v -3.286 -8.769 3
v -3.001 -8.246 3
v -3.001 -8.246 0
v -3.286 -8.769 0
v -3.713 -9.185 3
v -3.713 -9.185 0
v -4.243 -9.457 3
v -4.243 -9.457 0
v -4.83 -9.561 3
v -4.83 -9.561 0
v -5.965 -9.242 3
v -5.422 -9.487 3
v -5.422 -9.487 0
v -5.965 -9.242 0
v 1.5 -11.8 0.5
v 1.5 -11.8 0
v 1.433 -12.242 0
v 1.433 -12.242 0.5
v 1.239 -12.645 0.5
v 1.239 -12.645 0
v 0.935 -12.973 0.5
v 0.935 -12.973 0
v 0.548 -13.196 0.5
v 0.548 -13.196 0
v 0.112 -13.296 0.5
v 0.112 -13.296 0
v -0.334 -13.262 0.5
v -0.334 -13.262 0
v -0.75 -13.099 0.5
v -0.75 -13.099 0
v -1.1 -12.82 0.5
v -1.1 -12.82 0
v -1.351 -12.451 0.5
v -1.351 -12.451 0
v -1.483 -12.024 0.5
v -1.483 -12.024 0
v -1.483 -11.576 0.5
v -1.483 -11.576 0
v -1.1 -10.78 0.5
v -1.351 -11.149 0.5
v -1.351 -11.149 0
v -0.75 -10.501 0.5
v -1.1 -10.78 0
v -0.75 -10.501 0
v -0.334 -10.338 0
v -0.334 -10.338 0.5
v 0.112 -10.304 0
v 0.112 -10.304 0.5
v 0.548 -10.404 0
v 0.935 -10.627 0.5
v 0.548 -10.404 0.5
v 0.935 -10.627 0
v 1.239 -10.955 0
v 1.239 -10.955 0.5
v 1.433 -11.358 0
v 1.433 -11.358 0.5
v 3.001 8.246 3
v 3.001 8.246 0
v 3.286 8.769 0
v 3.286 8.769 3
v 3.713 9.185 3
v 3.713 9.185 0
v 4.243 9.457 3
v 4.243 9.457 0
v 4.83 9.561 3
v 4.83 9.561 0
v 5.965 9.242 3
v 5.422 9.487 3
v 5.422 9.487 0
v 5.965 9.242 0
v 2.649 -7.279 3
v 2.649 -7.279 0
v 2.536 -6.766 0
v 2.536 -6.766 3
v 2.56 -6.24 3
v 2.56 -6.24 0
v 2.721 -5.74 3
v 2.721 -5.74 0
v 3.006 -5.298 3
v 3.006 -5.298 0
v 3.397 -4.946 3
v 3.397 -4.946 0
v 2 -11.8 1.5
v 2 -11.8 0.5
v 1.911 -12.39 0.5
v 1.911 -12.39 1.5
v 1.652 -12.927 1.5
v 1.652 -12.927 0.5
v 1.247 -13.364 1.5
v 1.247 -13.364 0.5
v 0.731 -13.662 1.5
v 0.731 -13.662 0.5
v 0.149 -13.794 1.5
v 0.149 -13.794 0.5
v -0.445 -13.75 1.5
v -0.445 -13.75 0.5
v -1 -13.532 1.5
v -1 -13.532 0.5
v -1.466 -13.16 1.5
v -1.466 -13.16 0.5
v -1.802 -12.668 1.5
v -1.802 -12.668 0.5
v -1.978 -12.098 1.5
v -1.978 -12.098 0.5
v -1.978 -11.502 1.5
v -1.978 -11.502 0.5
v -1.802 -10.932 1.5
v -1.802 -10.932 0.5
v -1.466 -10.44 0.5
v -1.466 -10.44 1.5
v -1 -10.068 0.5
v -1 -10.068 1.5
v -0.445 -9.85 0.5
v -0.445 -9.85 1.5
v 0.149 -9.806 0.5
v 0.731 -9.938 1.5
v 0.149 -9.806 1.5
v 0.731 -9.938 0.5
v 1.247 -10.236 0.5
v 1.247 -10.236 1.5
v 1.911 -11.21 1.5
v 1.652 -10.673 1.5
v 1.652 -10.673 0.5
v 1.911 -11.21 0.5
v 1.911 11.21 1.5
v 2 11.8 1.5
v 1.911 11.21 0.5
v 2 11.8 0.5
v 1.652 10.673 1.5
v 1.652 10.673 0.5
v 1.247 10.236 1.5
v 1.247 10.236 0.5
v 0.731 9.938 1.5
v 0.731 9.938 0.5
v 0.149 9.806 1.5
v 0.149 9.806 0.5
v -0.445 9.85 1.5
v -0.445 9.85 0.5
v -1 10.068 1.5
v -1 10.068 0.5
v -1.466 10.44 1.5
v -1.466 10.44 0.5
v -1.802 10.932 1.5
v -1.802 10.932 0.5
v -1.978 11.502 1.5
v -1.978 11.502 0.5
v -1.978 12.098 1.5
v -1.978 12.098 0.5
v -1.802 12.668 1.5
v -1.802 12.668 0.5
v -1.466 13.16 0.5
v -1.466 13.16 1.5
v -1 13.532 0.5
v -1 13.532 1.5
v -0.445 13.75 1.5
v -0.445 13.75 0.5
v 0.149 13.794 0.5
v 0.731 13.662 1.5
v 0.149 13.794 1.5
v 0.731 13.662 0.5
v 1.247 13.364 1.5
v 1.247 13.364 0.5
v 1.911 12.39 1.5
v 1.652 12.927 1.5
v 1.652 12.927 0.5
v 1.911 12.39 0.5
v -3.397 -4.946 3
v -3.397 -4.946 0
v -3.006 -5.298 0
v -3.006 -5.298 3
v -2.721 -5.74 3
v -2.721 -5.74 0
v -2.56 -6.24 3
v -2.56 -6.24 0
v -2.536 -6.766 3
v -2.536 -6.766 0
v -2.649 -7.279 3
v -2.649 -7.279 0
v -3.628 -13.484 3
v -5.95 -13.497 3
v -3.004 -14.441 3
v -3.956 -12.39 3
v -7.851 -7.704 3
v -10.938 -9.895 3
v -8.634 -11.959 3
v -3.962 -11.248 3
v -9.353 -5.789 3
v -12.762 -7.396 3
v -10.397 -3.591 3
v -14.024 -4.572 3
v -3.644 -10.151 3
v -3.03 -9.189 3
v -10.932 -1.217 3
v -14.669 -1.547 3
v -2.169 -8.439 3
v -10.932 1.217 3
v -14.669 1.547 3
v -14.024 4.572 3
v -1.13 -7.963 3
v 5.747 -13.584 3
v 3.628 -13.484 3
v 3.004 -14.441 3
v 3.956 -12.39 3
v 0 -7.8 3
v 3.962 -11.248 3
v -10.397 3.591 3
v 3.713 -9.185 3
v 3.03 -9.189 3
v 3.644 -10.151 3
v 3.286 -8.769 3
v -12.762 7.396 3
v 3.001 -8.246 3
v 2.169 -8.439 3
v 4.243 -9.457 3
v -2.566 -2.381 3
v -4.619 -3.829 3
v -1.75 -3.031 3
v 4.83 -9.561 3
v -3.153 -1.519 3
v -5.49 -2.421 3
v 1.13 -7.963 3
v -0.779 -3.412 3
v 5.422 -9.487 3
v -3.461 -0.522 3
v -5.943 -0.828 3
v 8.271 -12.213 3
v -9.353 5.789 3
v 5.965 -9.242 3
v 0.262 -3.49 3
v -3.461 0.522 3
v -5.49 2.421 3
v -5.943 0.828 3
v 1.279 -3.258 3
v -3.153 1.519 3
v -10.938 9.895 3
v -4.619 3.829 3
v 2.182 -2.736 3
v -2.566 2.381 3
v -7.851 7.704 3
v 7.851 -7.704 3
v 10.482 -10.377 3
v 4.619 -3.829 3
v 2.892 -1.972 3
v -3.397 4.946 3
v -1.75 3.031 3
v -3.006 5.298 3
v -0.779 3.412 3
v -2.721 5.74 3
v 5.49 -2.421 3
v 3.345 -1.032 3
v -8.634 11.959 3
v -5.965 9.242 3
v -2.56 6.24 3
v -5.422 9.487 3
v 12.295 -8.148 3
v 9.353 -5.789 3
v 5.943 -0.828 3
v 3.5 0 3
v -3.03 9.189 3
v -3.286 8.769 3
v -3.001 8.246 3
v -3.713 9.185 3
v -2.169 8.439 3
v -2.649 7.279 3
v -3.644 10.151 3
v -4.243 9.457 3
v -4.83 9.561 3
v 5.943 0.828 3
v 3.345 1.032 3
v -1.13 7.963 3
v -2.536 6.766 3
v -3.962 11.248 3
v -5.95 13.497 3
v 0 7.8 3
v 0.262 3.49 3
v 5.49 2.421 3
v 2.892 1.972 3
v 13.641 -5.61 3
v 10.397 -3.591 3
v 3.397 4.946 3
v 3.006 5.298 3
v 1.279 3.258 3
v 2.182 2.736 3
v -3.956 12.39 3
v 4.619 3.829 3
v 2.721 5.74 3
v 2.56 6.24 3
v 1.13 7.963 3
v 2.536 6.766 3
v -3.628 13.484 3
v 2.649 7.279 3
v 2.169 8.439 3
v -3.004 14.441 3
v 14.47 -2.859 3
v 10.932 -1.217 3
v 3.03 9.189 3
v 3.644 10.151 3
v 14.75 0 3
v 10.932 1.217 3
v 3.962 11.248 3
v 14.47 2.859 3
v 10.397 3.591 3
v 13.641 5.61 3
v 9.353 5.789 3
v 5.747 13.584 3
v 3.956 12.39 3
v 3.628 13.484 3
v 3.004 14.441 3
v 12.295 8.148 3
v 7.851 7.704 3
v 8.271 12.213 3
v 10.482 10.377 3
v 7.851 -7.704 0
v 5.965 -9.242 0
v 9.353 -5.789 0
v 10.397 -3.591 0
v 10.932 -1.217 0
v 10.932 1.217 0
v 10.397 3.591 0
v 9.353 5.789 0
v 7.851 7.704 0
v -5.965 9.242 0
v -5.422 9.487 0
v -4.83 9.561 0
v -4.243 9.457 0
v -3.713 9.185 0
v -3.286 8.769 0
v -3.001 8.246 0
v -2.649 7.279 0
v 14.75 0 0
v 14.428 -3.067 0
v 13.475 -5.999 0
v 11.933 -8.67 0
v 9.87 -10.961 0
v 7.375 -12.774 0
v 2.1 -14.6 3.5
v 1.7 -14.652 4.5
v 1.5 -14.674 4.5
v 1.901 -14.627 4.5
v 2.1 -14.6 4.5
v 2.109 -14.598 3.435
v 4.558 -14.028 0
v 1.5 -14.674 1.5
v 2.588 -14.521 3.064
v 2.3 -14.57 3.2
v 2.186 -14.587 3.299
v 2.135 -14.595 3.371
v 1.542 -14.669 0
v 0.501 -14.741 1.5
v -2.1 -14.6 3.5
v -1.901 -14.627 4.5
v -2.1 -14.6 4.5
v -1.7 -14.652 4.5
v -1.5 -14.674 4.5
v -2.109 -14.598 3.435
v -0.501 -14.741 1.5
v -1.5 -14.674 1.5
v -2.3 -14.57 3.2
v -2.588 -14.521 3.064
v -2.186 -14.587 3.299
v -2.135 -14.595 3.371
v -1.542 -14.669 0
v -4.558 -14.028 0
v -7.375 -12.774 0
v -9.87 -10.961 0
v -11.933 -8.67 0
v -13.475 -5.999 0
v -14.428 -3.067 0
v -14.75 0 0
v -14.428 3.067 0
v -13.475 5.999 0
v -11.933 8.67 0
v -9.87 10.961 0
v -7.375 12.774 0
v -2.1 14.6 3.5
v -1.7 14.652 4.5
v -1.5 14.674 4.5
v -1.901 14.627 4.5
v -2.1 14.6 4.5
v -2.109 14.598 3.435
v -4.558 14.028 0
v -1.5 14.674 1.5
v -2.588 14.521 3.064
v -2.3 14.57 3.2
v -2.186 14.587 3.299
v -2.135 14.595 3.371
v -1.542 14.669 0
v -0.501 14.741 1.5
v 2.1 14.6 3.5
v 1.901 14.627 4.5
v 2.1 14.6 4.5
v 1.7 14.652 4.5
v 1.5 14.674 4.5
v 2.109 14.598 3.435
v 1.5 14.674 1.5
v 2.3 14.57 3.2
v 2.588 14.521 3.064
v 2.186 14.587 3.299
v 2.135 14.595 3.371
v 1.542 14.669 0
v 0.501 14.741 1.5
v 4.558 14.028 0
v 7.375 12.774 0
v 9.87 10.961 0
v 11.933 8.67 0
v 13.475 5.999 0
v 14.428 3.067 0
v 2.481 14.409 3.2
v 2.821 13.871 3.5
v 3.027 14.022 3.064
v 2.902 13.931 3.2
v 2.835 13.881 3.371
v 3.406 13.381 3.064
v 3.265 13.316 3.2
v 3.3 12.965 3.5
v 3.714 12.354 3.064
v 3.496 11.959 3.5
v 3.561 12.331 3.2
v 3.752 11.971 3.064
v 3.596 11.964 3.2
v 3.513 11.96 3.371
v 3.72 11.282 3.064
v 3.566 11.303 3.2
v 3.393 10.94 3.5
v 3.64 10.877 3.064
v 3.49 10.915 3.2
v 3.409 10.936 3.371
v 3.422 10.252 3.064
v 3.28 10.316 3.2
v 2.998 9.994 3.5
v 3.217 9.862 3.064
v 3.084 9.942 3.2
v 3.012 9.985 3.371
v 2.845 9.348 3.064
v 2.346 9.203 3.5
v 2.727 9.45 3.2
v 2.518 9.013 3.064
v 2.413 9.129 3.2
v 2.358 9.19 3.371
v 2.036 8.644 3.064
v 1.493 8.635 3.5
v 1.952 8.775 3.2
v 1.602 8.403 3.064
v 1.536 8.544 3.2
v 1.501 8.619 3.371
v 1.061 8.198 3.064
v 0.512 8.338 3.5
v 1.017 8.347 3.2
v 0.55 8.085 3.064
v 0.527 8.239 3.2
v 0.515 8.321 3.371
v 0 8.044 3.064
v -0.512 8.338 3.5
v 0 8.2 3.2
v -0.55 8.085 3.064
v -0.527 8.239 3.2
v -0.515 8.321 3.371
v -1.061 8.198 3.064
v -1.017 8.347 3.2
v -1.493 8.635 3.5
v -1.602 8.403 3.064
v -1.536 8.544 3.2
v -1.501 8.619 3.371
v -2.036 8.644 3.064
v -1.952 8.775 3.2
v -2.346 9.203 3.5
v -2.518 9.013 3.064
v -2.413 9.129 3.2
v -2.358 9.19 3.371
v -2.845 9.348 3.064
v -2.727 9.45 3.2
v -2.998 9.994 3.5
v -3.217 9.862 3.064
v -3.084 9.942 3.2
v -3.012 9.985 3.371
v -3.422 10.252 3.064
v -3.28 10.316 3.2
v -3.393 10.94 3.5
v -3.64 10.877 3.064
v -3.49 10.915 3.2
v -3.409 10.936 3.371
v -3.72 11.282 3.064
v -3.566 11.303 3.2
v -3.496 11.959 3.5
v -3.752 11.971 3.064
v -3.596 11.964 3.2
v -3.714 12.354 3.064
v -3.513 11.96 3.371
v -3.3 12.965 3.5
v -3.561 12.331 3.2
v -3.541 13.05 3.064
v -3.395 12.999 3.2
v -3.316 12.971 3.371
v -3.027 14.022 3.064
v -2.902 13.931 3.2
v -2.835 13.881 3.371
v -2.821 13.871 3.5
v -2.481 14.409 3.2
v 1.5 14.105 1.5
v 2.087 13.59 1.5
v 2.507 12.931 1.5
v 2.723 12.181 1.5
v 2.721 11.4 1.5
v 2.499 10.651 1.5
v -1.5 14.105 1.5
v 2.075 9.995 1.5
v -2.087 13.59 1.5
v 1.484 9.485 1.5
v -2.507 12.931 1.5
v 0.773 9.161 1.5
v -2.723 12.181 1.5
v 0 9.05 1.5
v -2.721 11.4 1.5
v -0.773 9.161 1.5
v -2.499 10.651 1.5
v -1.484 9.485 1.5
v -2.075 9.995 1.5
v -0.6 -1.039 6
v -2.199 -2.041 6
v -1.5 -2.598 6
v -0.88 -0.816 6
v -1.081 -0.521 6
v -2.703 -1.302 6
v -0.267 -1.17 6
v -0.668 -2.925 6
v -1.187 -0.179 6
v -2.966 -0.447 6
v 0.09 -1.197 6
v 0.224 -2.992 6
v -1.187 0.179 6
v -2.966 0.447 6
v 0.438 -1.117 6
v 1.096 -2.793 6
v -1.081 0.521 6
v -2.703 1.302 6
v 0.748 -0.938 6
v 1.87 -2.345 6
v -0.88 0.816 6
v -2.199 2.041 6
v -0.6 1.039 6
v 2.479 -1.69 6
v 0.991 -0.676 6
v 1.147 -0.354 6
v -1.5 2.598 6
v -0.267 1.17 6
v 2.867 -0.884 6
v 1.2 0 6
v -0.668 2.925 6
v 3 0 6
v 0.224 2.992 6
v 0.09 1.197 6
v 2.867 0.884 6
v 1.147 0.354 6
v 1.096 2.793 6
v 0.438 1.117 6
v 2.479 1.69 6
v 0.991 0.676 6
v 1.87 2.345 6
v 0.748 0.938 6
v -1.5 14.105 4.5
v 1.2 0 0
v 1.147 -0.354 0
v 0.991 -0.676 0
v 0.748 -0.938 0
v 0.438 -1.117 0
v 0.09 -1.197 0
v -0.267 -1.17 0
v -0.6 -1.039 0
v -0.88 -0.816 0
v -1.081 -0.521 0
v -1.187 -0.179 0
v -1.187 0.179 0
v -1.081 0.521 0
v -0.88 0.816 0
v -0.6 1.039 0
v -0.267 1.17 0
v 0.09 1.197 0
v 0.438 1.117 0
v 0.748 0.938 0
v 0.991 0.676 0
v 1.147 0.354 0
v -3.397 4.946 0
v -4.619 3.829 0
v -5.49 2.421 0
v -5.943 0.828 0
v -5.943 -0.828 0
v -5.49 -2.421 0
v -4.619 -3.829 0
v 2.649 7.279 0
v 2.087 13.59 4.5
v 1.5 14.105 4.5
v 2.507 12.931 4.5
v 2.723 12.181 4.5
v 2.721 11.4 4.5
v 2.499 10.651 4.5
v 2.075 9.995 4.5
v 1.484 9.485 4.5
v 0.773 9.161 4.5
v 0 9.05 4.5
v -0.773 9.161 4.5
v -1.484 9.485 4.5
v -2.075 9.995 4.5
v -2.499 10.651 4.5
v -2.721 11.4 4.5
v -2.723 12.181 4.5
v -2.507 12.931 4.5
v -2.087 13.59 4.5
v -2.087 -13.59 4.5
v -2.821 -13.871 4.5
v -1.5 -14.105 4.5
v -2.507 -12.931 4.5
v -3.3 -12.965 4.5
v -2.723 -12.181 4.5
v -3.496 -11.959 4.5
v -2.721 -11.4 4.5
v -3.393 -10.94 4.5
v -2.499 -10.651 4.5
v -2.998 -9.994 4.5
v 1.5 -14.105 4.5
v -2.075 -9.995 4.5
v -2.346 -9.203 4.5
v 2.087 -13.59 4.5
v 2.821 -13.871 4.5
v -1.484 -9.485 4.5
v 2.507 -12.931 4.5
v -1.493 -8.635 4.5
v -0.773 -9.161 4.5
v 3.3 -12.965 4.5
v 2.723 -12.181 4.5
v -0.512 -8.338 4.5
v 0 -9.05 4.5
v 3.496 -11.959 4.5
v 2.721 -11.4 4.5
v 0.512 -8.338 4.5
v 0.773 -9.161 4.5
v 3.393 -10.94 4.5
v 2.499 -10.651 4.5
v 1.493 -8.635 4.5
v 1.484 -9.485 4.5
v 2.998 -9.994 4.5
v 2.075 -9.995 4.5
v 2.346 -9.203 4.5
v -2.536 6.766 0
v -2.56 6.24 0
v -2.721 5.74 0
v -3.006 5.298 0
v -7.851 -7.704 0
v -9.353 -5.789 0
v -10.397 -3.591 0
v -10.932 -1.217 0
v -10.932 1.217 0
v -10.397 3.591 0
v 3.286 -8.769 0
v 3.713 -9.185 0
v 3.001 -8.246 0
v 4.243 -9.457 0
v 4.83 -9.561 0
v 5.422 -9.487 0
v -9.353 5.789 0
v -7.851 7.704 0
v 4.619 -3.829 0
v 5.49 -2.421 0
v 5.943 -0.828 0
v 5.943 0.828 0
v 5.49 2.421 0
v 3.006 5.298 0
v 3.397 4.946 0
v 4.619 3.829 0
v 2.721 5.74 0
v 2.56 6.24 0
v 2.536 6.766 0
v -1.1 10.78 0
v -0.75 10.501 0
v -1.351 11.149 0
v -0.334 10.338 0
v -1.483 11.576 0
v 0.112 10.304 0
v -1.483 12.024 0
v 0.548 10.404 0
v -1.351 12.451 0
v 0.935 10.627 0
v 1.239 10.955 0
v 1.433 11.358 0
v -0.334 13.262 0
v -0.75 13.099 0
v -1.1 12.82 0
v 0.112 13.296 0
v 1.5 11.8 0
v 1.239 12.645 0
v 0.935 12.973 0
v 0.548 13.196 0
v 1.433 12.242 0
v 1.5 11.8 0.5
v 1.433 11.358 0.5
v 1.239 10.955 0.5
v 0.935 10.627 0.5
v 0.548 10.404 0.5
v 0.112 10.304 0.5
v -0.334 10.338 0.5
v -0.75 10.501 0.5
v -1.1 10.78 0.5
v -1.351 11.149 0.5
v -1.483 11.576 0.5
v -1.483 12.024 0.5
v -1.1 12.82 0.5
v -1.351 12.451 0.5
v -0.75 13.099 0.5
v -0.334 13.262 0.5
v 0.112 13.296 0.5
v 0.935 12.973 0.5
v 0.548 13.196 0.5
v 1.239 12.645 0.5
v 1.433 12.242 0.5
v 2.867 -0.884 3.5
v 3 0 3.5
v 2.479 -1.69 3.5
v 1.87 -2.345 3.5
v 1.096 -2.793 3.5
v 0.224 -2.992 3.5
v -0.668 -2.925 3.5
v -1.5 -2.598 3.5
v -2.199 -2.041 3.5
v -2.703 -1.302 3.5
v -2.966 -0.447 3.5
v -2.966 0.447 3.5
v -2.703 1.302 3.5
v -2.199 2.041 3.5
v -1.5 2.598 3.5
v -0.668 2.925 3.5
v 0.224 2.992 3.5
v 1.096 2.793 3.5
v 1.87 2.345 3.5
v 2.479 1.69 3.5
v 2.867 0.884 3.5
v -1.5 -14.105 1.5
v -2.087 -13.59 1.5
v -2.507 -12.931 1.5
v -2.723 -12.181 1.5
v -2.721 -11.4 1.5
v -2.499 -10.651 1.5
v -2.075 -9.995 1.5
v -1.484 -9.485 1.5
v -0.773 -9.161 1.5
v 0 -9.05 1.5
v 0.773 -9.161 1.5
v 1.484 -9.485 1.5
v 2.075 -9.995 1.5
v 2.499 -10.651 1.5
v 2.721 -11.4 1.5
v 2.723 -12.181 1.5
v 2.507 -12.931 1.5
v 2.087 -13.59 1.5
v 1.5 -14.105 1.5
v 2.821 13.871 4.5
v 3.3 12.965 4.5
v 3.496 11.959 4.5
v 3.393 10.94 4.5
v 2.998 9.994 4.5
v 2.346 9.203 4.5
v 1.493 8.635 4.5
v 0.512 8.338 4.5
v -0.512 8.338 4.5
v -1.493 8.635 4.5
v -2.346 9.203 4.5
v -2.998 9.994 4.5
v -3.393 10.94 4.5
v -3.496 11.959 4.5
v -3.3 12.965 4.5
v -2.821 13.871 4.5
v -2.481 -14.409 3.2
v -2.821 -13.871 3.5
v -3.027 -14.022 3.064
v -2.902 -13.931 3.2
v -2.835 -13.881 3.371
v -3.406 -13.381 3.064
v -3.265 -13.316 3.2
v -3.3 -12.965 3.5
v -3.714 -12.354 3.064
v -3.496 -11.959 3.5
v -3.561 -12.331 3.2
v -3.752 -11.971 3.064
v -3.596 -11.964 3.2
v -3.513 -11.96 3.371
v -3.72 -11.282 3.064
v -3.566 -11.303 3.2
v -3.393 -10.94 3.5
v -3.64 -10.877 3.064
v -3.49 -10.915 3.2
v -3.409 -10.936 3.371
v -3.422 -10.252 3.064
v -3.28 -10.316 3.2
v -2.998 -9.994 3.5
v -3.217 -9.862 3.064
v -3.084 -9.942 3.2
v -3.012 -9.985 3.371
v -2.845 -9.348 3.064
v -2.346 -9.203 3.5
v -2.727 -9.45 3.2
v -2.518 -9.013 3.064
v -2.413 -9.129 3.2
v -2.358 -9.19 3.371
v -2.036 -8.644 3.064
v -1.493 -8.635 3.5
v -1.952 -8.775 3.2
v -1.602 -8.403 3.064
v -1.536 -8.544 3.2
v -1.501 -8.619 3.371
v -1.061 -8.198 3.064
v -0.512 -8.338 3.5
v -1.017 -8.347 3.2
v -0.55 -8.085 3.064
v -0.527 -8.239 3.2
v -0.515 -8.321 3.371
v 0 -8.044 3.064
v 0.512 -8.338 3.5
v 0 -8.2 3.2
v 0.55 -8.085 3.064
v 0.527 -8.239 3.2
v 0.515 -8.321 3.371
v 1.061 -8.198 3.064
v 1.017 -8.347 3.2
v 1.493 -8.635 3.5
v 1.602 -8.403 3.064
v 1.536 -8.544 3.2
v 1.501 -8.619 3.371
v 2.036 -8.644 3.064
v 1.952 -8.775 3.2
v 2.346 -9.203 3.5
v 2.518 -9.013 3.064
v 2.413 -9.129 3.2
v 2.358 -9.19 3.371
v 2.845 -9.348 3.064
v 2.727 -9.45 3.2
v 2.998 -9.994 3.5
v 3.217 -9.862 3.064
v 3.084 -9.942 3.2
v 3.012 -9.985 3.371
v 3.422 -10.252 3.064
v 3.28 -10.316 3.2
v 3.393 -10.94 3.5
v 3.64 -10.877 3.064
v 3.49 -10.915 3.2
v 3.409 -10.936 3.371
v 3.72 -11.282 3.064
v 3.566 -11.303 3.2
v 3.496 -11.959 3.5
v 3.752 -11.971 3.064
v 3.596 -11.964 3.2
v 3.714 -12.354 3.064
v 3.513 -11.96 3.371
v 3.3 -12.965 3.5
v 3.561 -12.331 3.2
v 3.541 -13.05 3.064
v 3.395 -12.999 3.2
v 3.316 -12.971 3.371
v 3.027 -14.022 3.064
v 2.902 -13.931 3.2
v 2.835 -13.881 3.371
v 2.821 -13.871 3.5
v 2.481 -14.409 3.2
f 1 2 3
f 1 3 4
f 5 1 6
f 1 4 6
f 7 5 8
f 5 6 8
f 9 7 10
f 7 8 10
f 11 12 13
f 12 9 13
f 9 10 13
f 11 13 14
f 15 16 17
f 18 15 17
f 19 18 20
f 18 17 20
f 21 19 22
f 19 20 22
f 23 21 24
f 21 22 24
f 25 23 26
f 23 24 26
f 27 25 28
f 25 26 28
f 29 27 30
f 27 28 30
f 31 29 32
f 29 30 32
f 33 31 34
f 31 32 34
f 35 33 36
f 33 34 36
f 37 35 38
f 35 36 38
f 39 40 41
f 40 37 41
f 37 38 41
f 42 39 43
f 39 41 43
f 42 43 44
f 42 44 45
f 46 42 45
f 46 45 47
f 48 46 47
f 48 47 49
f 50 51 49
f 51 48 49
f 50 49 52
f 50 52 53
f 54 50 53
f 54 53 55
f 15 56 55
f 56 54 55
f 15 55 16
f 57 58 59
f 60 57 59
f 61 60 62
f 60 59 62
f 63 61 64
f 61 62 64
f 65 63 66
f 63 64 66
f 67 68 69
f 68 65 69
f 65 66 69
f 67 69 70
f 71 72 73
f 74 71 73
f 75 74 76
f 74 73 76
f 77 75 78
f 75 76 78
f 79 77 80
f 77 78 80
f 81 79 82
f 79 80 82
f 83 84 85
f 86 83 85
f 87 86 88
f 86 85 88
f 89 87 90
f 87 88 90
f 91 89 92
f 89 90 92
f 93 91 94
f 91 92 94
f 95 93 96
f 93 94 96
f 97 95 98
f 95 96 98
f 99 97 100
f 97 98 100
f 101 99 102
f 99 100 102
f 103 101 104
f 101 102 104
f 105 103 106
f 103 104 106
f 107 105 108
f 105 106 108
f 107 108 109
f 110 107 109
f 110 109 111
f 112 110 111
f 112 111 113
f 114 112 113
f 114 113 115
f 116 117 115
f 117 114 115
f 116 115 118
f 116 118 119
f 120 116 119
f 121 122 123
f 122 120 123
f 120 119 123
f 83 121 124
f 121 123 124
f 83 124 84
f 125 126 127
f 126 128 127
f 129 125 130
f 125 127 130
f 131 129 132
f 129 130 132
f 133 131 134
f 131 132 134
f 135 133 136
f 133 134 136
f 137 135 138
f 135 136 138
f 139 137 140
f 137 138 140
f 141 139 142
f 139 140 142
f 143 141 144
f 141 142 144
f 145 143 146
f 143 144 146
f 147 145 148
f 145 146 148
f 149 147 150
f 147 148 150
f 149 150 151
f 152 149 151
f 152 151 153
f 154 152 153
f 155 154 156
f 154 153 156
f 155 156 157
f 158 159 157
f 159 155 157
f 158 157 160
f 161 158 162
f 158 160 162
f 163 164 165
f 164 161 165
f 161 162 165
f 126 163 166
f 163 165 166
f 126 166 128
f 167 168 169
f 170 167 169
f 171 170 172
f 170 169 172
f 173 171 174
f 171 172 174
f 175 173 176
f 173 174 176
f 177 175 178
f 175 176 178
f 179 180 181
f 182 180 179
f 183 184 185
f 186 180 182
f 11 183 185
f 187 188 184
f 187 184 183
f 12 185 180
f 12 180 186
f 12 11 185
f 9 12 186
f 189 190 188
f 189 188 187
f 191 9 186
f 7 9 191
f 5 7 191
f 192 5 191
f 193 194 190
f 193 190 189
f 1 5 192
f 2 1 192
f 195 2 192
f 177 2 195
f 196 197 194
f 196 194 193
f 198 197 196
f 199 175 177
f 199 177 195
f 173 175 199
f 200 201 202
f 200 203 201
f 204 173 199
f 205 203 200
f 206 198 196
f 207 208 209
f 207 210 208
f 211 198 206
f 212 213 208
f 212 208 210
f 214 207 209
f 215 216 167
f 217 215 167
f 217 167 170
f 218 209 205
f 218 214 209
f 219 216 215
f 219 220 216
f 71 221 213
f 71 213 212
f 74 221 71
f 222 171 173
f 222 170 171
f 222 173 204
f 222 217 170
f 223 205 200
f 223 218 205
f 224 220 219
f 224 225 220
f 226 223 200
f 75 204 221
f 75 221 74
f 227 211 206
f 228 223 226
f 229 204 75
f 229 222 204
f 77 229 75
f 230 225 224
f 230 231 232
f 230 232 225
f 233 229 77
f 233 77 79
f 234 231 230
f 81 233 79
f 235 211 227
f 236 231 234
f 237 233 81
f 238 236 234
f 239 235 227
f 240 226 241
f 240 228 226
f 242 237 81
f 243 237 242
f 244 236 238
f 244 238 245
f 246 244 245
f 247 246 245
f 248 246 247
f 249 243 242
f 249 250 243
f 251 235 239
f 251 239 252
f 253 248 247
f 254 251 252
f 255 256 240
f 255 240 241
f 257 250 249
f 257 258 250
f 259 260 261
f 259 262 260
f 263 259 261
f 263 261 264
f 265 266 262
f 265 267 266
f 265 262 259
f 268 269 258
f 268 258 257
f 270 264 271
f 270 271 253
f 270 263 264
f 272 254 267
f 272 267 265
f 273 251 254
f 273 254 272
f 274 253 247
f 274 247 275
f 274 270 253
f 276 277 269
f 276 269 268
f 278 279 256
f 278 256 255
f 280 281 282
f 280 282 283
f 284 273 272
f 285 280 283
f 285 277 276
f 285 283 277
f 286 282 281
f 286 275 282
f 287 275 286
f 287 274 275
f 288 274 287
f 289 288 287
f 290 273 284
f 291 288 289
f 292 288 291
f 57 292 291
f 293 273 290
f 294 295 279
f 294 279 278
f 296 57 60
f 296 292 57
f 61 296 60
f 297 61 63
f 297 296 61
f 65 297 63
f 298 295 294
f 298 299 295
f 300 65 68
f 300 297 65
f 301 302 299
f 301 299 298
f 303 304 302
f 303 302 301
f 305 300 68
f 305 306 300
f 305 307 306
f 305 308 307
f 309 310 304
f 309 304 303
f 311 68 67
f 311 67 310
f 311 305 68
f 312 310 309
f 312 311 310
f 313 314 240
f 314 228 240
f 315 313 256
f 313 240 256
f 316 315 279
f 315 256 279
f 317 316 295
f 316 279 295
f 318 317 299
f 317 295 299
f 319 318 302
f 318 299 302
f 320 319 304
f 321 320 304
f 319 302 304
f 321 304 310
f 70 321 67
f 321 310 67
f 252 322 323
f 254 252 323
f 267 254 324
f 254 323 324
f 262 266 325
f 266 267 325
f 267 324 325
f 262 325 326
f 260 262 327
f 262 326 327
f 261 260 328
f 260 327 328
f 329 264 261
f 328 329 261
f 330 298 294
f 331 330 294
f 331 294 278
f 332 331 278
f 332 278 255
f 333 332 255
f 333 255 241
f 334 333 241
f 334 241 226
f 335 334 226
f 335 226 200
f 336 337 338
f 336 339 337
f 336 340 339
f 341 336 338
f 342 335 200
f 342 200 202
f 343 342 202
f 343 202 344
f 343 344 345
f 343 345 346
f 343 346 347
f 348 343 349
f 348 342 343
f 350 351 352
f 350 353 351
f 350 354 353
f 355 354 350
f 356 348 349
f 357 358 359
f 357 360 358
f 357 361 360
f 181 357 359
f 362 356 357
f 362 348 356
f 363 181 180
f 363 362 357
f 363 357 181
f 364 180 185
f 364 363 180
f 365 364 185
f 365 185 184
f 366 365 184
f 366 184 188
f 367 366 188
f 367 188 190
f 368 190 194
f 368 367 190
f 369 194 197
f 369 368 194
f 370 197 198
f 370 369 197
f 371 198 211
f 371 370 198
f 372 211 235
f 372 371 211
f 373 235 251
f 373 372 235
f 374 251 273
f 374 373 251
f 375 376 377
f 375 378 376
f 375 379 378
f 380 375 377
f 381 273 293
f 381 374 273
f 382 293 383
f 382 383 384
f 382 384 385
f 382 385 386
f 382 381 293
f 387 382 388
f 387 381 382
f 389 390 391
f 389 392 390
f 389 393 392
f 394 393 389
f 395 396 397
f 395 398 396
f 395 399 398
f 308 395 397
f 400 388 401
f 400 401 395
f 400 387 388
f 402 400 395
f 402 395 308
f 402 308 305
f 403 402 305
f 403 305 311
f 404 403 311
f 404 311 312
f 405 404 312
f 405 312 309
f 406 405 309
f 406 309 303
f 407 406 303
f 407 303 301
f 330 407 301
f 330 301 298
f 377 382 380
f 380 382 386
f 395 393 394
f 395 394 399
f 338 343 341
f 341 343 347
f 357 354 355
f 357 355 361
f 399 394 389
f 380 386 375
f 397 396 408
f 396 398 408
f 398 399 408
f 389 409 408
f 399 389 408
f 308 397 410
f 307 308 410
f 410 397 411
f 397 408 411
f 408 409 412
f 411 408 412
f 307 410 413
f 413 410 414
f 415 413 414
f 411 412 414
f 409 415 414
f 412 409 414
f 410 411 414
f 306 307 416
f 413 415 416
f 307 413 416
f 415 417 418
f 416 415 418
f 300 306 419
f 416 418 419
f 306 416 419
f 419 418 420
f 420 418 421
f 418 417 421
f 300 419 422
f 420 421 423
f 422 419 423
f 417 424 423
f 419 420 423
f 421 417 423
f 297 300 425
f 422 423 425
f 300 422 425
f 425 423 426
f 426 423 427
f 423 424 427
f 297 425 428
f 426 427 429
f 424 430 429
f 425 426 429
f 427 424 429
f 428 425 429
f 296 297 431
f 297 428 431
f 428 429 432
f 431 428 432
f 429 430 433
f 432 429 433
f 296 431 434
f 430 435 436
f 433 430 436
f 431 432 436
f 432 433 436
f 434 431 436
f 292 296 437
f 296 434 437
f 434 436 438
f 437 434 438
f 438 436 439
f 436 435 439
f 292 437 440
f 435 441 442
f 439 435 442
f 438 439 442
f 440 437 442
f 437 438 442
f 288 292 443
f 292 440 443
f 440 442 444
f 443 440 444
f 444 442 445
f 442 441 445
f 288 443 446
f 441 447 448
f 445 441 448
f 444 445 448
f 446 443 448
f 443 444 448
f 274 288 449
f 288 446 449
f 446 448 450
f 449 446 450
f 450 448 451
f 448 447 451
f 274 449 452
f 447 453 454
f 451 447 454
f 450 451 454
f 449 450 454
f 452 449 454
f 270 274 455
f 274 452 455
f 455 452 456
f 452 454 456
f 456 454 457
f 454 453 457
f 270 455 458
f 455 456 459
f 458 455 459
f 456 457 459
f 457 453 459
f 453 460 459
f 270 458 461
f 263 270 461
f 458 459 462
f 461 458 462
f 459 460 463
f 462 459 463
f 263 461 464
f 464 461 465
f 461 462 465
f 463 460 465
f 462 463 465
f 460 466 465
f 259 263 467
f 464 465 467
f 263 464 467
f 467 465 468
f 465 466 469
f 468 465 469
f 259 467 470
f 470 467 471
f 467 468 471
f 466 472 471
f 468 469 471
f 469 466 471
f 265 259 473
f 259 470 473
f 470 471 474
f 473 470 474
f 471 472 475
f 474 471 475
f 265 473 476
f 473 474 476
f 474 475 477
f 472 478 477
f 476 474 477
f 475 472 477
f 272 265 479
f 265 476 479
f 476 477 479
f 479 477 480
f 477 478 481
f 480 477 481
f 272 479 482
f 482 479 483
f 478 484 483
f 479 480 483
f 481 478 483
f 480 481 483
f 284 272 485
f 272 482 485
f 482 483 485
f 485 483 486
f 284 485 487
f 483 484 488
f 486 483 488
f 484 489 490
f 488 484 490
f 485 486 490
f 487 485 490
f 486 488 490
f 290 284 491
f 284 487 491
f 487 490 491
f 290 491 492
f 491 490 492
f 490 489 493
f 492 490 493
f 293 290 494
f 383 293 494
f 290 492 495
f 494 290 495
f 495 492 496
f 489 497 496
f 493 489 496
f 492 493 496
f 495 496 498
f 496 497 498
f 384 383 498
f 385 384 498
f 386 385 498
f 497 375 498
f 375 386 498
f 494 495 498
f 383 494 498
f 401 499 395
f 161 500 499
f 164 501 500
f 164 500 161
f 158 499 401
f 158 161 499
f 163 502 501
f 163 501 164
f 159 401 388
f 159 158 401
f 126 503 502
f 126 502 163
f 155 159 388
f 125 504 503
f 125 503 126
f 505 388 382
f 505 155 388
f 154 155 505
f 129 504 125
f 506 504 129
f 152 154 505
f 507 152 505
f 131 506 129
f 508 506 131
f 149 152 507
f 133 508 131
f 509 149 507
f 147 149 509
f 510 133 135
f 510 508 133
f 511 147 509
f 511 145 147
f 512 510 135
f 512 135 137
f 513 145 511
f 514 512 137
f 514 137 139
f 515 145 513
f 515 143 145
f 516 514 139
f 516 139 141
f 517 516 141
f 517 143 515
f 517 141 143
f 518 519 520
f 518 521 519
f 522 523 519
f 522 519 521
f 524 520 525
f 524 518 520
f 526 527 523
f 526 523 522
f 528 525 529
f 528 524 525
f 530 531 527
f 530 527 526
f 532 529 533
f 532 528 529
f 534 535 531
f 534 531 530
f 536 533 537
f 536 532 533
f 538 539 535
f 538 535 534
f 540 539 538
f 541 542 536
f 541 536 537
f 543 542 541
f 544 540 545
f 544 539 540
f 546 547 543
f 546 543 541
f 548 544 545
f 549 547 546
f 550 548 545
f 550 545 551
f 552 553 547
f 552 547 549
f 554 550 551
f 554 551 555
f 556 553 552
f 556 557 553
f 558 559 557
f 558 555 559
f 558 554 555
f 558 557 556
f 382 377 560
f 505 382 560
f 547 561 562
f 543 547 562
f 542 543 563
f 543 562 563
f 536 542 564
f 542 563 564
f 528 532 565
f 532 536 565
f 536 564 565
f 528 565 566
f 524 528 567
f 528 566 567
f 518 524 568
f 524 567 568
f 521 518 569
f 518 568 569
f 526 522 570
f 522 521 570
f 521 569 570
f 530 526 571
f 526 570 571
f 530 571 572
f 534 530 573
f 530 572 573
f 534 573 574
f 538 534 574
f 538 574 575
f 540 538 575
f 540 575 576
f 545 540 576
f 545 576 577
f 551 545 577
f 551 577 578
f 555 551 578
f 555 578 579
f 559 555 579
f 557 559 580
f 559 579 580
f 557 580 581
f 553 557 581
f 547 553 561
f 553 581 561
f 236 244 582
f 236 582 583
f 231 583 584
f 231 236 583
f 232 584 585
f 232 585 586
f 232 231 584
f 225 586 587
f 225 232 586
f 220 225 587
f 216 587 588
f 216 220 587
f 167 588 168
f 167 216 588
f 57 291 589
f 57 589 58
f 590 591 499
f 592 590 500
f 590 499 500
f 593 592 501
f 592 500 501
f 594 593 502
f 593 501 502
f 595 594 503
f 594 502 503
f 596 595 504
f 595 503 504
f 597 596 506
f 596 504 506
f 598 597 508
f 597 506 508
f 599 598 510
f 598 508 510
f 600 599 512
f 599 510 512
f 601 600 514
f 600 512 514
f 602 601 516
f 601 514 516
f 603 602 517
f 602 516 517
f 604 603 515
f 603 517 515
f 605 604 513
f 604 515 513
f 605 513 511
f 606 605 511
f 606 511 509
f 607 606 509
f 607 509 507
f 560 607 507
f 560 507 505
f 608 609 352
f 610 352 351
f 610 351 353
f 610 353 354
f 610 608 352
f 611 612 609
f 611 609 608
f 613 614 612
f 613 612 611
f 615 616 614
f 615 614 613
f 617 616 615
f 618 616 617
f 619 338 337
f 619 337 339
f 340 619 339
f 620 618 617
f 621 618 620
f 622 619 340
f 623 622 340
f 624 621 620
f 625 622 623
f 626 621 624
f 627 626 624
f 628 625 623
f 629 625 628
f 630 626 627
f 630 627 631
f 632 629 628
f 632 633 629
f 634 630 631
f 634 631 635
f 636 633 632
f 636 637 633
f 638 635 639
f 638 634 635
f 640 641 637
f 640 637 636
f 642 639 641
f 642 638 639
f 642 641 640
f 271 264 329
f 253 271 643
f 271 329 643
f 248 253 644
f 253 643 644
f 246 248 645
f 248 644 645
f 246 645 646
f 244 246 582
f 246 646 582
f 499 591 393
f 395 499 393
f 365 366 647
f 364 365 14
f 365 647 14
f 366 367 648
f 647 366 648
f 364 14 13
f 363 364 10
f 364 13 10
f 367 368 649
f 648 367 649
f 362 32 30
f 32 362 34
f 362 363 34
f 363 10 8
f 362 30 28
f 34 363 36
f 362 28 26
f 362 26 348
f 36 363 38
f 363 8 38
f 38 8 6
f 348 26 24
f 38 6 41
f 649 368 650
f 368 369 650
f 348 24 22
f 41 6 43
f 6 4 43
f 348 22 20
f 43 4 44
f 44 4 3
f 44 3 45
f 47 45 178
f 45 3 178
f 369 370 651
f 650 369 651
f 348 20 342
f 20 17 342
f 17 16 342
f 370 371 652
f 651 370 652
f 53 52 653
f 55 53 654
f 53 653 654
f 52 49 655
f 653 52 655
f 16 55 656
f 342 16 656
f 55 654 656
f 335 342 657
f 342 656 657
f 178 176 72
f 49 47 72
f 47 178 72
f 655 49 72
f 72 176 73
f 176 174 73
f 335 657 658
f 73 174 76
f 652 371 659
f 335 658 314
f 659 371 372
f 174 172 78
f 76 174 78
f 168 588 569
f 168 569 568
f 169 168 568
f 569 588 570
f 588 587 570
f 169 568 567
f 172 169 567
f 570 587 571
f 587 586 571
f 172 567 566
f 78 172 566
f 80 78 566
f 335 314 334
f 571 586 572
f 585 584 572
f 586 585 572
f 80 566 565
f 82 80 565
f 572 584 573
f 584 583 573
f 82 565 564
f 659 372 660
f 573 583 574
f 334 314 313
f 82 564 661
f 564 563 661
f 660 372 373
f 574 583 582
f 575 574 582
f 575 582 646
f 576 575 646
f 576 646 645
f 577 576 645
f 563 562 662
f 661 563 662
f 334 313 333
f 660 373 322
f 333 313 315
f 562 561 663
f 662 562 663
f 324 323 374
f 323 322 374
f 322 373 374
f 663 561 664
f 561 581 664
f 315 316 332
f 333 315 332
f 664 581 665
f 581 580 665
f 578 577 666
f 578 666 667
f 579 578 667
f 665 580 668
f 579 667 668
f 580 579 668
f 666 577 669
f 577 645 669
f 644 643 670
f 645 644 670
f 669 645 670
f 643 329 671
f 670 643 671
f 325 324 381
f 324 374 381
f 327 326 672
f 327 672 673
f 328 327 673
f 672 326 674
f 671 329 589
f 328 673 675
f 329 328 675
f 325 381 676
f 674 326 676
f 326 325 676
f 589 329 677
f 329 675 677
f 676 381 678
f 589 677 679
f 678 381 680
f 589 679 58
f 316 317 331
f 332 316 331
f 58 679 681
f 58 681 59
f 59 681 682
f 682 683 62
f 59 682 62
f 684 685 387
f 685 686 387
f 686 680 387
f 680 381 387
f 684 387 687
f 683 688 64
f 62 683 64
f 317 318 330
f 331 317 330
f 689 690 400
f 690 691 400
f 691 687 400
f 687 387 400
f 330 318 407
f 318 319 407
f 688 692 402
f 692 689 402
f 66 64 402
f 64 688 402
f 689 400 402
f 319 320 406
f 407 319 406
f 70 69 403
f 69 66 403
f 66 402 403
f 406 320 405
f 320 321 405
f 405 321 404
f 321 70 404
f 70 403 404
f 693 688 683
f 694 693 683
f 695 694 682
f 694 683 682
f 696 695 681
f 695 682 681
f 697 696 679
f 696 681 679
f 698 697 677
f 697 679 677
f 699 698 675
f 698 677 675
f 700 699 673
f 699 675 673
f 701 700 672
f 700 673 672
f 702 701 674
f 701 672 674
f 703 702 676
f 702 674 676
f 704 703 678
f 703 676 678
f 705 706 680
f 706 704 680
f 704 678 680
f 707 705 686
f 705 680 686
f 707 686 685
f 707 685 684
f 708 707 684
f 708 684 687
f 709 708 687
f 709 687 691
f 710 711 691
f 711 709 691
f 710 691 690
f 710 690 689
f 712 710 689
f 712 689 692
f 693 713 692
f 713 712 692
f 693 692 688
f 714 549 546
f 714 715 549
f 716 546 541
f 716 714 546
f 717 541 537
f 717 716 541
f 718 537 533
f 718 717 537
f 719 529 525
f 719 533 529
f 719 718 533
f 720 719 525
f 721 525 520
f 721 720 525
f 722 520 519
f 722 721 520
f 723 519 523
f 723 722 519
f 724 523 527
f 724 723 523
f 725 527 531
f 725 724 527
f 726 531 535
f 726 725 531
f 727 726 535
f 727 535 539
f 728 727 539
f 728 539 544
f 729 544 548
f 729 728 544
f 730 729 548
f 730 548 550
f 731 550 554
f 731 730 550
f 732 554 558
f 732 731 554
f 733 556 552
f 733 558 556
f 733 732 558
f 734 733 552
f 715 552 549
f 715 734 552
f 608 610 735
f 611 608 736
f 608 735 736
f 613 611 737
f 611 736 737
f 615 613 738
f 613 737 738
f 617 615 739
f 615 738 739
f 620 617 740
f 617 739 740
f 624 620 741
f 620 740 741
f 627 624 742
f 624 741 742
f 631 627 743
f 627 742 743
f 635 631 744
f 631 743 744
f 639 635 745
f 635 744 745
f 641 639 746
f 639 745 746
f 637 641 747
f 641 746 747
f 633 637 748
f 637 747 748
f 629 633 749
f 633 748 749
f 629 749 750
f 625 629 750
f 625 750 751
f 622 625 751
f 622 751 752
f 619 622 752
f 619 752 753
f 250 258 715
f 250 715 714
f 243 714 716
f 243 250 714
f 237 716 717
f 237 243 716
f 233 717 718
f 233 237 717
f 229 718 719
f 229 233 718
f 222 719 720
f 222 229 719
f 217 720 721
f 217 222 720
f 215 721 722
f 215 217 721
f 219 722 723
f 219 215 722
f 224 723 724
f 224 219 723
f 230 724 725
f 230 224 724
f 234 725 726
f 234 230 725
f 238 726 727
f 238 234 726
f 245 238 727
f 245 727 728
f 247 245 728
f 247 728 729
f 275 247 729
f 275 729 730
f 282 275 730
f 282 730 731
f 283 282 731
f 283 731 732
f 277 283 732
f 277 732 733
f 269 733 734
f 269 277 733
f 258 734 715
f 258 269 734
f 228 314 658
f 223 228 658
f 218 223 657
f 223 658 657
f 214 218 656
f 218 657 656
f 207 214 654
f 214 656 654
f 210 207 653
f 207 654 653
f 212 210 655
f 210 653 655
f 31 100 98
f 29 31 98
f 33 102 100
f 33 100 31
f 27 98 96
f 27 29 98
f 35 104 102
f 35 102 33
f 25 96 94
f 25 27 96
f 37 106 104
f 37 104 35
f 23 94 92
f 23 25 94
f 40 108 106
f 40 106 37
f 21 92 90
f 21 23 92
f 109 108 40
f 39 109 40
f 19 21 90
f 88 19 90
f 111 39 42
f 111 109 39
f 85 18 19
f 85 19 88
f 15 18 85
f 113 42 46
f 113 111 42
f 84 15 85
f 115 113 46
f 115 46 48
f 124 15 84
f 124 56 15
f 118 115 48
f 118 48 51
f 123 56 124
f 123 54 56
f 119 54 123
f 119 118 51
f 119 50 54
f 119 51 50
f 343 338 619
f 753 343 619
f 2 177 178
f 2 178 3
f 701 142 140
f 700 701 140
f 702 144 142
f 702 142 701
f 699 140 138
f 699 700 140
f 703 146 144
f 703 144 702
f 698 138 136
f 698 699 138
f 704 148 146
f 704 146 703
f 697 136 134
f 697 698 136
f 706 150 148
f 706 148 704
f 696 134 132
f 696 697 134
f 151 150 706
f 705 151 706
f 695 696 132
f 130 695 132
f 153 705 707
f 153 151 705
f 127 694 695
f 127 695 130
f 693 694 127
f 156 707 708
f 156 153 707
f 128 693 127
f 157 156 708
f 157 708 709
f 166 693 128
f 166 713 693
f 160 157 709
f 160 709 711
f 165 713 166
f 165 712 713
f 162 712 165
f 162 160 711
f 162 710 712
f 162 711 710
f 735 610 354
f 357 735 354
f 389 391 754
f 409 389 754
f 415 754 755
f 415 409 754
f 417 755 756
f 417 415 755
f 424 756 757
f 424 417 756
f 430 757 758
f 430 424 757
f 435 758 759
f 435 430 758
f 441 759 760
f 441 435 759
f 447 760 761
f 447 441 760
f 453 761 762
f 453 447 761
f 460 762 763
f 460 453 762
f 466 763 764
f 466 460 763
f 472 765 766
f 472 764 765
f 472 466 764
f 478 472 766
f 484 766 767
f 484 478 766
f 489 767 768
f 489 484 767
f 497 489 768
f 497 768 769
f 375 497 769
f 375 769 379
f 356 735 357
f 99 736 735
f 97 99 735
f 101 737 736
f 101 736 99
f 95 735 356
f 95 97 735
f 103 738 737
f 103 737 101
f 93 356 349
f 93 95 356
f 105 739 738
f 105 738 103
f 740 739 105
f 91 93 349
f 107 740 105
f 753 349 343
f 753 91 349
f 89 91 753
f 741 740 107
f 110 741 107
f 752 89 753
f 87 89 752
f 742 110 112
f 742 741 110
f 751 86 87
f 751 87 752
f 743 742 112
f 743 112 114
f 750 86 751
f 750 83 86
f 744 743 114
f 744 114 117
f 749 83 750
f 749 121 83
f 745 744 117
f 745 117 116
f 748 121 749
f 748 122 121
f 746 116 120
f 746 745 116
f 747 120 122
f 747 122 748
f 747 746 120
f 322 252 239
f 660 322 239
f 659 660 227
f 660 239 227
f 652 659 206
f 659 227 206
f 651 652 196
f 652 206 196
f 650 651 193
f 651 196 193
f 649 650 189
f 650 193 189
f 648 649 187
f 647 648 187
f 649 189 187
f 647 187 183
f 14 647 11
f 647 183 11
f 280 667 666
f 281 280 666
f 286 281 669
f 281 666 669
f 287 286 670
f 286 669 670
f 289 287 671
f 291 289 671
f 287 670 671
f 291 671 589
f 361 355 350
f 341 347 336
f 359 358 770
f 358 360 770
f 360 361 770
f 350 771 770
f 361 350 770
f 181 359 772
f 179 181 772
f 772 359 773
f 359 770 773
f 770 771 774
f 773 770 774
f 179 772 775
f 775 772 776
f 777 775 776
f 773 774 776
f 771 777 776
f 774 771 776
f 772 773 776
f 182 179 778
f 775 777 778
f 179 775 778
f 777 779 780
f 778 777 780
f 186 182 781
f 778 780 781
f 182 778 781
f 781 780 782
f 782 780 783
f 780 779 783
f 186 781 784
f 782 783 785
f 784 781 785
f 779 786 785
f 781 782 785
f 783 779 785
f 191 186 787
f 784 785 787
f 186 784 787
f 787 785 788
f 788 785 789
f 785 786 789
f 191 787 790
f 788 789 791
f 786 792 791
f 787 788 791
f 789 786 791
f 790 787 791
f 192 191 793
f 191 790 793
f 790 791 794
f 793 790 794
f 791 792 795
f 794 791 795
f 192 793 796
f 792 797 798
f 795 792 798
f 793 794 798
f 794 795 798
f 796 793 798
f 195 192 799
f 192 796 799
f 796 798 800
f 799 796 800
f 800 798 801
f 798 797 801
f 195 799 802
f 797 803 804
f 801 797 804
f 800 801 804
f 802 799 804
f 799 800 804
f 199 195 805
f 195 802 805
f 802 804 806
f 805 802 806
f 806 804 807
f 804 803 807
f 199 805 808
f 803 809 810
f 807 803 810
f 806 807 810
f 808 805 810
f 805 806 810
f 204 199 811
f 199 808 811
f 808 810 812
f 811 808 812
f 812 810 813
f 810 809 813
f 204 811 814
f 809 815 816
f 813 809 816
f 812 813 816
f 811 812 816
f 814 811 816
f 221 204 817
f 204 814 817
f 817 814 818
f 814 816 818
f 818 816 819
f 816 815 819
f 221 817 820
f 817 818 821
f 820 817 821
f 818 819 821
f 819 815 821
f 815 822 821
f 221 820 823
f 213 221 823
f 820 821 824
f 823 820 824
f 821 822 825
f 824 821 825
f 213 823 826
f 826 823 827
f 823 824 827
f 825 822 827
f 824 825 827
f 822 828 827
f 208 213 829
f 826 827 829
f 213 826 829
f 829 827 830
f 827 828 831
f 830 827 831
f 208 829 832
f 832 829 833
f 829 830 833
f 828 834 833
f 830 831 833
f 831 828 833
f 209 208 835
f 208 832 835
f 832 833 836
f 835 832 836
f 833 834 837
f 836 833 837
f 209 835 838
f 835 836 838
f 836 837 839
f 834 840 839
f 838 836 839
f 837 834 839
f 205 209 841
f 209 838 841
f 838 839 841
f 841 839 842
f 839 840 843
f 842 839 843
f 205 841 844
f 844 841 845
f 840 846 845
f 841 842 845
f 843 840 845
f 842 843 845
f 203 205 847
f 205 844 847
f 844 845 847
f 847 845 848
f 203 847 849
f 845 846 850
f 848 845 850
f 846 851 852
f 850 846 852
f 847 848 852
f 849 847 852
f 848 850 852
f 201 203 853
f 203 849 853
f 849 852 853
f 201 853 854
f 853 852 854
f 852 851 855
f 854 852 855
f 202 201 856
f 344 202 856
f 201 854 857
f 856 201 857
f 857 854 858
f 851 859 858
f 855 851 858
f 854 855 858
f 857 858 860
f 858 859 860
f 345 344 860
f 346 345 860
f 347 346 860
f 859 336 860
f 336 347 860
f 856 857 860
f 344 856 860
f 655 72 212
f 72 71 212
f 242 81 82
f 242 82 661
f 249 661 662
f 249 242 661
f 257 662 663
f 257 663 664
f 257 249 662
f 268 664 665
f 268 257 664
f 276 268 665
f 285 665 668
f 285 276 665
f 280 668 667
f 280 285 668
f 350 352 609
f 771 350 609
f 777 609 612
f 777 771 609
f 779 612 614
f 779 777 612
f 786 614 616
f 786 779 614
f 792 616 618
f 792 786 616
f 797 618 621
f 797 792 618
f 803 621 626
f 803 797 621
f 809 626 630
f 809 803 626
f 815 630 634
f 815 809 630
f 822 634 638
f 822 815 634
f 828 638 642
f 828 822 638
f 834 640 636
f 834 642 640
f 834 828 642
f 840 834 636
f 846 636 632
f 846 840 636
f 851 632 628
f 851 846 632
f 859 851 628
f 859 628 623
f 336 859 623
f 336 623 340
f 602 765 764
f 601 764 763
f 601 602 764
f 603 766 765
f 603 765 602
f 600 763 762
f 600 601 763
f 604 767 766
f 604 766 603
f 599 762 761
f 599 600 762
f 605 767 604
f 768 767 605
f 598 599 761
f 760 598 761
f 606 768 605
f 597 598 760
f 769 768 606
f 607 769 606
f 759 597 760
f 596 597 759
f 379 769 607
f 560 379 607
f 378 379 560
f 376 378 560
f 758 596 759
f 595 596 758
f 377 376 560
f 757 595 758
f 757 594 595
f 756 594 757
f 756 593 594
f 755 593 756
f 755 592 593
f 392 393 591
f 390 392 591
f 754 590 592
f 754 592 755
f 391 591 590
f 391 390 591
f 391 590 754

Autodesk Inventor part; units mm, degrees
ref_plane "YZ Plane" through (0, 0, 0) normal (1, 0, 0) x (0, 1, 0)
ref_plane "XZ Plane" through (0, 0, 0) normal (0, 1, 0) x (-1, 0, 0)
ref_plane "XY Plane" through (0, 0, 0) normal (0, 0, 1) x (1, 0, 0)
sketch "Esquisse1" plane through (0, 0, 0) normal (0, 0, 1) x (1, 0, 0)
  circle A0 centre (0, 0) radius 1.2
  circle A1 centre (0, 0) radius 3
  circle A2 centre (0, 11.8) radius 2
  circle A3 centre (0, 11.8) radius 2.75
  circle A4 centre (0, -11.8) radius 2.75
  circle A5 centre (0, -11.8) radius 2
  circle A6 centre (0, 11.8) radius 1.5
  circle A7 centre (0, -11.8) radius 1.5
  arc A8 (-1.4212, 14.1543) -> (-1.4212, -14.1543) centre (0, 0) ccw
  arc A9 (1.4212, -14.1543) -> (1.4212, 14.1543) centre (0, 0) ccw
  circle A10 centre (0, 0) radius 14.75
  dimension "d1" = 2.4
  dimension "d2" = 6
  dimension "d3" = 4
  dimension "d4" = 11.8
  dimension "d5" = 5.5
  dimension "d8" = 360
  dimension "d12" = 3
  dimension "d15" = 360
  dimension "d95" = 29.5
extrude "Extrusion10" add sketch "Esquisse1" along normal blind 3 contours A3 A9 A4 A8 | A10
extrude "Extrusion11" add sketch "Esquisse1" along normal blind 6 contours A1
extrude "Extrusion12" add sketch "Esquisse1" along normal blind 0.5 contours A2 | A5
extrude "Extrusion13" add sketch "Esquisse1" along normal blind 1.5 contours A3 | A4
sketch "Esquisse3" plane through (0, 0, 3) normal (0, 0, 1) x (1, 0, 0)
  circle A0 centre (0, 0) radius 1.2 projected
  line L0 (0, 0) -> (-7.6468, 0)
  circle A1 centre (0, 0) radius 3 projected
  line L1 (0, 0) -> (4.4865, 0)
  line L2 (0, 16.0443) -> (0, -15.4592)
  line L3 (0, 0) -> (-3.7622, -10.3366)
  line L4 (0, 0) -> (3.7622, -10.3366)
  line L5 (0, 0) -> (3.7622, 10.3366)
  line L6 (0, 0) -> (-3.7622, 10.3366)
  arc A2 (3.7622, -10.3366) -> (3.7622, 10.3366) centre (0, 0) ccw
  arc A3 (-3.7622, 10.3366) -> (-3.7622, -10.3366) centre (0, 0) ccw
  arc A4 (2.0521, -5.6382) -> (2.0521, 5.6382) centre (0, 0) ccw
  arc A5 (-2.0521, 5.6382) -> (-2.0521, -5.6382) centre (0, 0) ccw
  dimension "d75" = 360
  dimension "d71" = 20
  dimension "d72" = 40
extrude "Extrusion15" cut sketch "Esquisse3" against normal through all contours L5 A2 L4 A4 | A5 L3 A3 L6
fillet "Congé1" radius 2 8 edges at (3.7622, -10.3366, 1.5) (-3.7622, -10.3366, 1.5) (-3.7622, 10.3366, 1.5) (3.7622, 10.3366, 1.5) (-2.0521, -5.6382, 1.5) (-2.0521, 5.6382, 1.5) (2.0521, -5.6382, 1.5) (2.0521, 5.6382, 1.5)
chamfer "Chanfrein1" distance 0.5 angle 45 1 edges at (-3, 0, 3)
sketch "Esquisse5" plane through (0, 0, 3) normal (0, 0, 1) x (1, 0, 0)
  circle A0 centre (0, -11.8) radius 1.5 projected
  arc A1 (2.1004, -14.5997) -> (-2.1004, -14.5997) centre (0, -11.8) ccw
  circle A2 centre (0, 11.8) radius 2.75 projected
  arc A3 (-2.1004, 14.5997) -> (2.1004, 14.5997) centre (0, 11.8) ccw
  circle A4 centre (0, -11.8) radius 2.75 projected
  circle A5 centre (0, 11.8) radius 2.75 projected
  circle A6 centre (0, 0) radius 1.2 projected
  circle A7 centre (0, 0) radius 14.75 projected
  arc A8 (-2.1004, -14.5997) -> (2.1004, -14.5997) centre (0, 0) ccw
  arc A9 (2.1004, 14.5997) -> (-2.1004, 14.5997) centre (0, 0) ccw
  circle A10 centre (0, -11.8) radius 2.75 projected
  dimension "d96" = 7
  dimension "d97" = 7
extrude "Extrusion18" add sketch "Esquisse5" along normal blind 1.5 contours A7 A1 | A7 A3
sketch "Esquisse6" plane through (0, 0, 4.5) normal (0, 0, 1) x (1, 0, 0)
  line L0 (-1.5, -15.5653) -> (1.5, -15.5653)
  line L1 (1.5, -15.5653) -> (1.5, -13.8468)
  line L2 (1.5, -13.8468) -> (-1.5, -13.8468)
  line L3 (-1.5, -13.8468) -> (-1.5, -15.5653)
  line L4 (0, 0) -> (0, -17.5217)
  dimension "d104" = 3
  dimension "d105" = 1.5
extrude "Extrusion19" cut sketch "Esquisse6" against normal blind 3
pattern_circular "Réseau circulaire3" count 2 over 360 about axis through (0, 0, 0) along (0, 0, 1) of "Extrusion19"
fillet "Congé3" radius 0.5 2 edges at (0, -8.3, 3) (0, 8.3, 3)
equation "\"d105\" = 0.5 * d104"
properties part number "magnet_holder-july21"
